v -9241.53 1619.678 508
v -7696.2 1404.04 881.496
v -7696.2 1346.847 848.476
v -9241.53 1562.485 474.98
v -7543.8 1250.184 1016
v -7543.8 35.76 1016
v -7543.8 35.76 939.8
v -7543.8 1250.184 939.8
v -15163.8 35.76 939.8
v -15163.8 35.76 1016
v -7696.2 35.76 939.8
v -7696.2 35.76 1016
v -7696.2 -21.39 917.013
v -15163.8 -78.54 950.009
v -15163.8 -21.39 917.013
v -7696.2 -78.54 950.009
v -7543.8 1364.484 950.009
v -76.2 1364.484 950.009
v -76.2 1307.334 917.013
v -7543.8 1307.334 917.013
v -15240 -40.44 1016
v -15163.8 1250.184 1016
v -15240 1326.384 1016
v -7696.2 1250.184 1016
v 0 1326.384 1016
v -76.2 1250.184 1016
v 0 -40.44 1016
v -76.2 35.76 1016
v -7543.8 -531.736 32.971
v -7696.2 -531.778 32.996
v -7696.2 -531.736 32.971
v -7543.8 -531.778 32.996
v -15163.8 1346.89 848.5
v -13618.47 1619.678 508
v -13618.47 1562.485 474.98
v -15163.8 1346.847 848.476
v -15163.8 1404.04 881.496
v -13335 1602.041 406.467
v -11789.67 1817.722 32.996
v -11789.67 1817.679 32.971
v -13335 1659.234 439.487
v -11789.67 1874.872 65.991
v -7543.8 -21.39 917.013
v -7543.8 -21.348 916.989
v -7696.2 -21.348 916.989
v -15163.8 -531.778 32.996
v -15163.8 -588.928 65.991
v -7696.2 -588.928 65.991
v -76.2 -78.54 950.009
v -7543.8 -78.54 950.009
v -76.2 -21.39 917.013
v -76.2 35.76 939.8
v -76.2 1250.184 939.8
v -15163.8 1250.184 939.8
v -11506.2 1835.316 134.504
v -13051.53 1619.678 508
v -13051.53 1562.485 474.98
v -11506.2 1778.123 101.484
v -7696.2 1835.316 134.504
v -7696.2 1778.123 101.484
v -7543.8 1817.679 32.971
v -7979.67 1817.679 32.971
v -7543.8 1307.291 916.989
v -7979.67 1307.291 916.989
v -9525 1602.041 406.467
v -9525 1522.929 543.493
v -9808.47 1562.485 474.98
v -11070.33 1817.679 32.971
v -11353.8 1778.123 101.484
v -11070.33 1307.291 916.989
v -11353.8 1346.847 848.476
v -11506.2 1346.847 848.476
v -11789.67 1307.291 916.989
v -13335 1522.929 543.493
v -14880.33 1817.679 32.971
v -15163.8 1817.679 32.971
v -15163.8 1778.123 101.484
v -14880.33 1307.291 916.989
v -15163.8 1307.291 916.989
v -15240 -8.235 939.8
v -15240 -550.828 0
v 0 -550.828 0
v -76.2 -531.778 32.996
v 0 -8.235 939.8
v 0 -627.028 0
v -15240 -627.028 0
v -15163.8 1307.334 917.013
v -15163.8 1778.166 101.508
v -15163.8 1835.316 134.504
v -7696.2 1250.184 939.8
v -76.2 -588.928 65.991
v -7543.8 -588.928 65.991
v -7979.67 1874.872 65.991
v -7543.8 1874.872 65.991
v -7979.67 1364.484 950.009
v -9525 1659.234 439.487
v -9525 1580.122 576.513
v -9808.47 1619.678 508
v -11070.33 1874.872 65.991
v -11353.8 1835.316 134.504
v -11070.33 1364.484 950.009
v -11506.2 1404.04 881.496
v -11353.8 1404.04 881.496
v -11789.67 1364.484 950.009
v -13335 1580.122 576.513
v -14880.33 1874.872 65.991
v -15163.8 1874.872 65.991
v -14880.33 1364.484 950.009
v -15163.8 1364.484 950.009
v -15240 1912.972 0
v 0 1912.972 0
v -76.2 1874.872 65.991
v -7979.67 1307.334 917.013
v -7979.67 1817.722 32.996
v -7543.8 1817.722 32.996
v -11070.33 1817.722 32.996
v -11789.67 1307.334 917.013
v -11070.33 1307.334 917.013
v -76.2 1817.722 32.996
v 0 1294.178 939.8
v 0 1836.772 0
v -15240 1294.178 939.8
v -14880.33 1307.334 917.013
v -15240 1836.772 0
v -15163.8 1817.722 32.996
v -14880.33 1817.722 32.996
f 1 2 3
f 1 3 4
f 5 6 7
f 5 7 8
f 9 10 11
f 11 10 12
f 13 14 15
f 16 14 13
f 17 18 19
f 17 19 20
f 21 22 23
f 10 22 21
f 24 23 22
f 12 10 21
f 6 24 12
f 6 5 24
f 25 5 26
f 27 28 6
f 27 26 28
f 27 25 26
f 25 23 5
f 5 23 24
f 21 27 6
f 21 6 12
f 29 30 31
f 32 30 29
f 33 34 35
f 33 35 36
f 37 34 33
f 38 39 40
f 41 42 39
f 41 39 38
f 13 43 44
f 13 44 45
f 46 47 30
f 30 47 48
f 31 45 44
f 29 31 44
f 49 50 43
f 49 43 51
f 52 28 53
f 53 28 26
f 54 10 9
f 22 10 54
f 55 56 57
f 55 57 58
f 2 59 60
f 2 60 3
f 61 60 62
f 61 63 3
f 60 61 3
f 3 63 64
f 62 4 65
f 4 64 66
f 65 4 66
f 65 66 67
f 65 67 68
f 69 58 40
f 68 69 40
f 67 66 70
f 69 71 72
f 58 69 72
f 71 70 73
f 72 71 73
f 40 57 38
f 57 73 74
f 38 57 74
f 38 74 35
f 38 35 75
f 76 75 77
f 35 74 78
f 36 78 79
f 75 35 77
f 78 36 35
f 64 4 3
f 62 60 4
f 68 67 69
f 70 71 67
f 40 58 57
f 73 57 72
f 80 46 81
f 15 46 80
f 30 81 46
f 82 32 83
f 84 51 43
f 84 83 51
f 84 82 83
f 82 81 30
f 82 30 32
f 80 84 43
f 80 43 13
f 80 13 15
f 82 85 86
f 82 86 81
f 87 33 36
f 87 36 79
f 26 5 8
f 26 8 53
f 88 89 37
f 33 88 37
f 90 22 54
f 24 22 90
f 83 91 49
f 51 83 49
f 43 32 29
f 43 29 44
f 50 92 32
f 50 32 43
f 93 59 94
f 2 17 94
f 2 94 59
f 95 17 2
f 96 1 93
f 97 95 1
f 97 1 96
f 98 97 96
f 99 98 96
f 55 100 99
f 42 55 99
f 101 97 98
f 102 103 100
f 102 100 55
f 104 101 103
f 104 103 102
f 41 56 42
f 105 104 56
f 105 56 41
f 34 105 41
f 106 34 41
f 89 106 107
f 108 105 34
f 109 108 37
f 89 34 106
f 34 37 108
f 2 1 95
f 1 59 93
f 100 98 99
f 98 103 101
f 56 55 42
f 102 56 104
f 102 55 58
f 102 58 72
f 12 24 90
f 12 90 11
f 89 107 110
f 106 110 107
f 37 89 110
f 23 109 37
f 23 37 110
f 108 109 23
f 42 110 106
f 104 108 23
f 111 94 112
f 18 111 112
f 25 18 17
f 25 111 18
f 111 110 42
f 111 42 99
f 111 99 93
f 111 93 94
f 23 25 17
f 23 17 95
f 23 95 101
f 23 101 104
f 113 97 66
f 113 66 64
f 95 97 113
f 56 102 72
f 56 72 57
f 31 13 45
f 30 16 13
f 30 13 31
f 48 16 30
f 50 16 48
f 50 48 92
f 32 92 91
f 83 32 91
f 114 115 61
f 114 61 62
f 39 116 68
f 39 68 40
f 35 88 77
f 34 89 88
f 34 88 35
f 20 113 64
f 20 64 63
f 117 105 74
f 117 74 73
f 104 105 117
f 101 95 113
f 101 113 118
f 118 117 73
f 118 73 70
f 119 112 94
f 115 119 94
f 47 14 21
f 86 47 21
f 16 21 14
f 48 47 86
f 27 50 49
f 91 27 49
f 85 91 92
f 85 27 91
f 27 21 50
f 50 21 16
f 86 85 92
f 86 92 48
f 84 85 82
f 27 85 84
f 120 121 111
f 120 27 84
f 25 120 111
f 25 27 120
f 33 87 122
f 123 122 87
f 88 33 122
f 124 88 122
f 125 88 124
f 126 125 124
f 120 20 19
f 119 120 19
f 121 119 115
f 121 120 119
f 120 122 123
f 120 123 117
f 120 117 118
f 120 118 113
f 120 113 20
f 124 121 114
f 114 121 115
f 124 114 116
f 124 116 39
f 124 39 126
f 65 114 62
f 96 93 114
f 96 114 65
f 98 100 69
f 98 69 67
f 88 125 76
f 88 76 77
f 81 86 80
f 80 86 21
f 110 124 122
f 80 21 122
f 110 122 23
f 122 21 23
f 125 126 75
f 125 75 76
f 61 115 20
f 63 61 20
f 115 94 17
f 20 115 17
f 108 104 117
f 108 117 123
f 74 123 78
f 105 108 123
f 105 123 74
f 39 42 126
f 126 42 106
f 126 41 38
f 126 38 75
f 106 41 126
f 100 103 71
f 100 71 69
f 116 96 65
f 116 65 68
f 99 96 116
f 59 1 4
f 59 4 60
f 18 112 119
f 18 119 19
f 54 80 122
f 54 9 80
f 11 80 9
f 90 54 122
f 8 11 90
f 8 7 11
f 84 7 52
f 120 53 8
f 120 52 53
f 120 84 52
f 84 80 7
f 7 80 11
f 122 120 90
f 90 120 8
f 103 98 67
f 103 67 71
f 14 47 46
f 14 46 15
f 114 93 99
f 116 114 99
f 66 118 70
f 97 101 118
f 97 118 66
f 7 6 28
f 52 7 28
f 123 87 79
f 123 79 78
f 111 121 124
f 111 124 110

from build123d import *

# Parameters (mm, degrees)
F1_DEPTH  = 15240
F2_W      = 15087.6
F2_H      = 1020.7757469933
F3_DEPTH  = 76.2
F4_W      = 15087.6
F4_H      = 1214.4242530067
F5_DEPTH  = 76.2
F6_W      = 15087.6
F6_H      = 1020.7757469933
F7_DEPTH  = 76.2
F9_DEPTH  = 66.04
F10_W     = 76.2
F10_H     = 1020.7757469933
F11_DEPTH = 66.04
F13_DEPTH = 76.2
F15_DEPTH = 66.04


with BuildPart() as f1:
    # F0 (on Right) → F1 (new body)
    with BuildSketch(Plane.YZ):
        Polygon((-40.4404837035, 1016), (-627.0283572002, 0), (-550.8283572002, 0), (-8.2345742158, 939.8), (1294.1778598154, 939.8), (1836.7716427998, 0), (1912.9716427998, 0), (1326.3837693031, 1016), align=None)
    extrude(amount=-F1_DEPTH)

    # F2 (on face) → F3 (cut)
    with BuildSketch(Plane(origin=(0, -470.2712679001, 271.5112431143), x_dir=(1, 0, 0), z_dir=(0, -0.8660254038, 0.5))):
        with Locations((-7620, 273.0736948966)):
            Rectangle(F2_W, F2_H)
    extrude(amount=-F3_DEPTH, mode=Mode.SUBTRACT)

    # F4 (on face) → F5 (cut)
    with BuildSketch(Plane.XY.offset(1016)):
        with Locations((-7620, 642.9716427998)):
            Rectangle(F4_W, F4_H)
    extrude(amount=-F5_DEPTH, mode=Mode.SUBTRACT)

    # F6 (on face) → F7 (cut)
    with BuildSketch(Plane(origin=(0, 1434.7287320999, 828.3410196919), x_dir=(-1, 0, 0), z_dir=(0, 0.8660254038, 0.5))):
        with Locations((7620, -369.8979479032)):
            Rectangle(F6_W, F6_H)
    extrude(amount=-F7_DEPTH, mode=Mode.SUBTRACT)

    # F8 (on face) → F9 (join)
    with BuildSketch(Plane(origin=(0, -470.2712679001, 271.5112431143), x_dir=(1, 0, 0), z_dir=(0, -0.8660254038, 0.5))):
        Polygon((-7543.8, 783.4615683932), (-7620, 783.4615683932), (-7620, 228.8013398647), (-7620, -237.3141786001), (-7543.8, -237.3141786001), align=None)
        Polygon((-7620, 228.8013398647), (-7620, 783.4615683932), (-7696.2, 783.4615683932), (-7696.2, -237.3141786001), (-7620, -237.3141786001), align=None)
    extrude(amount=-F9_DEPTH)

    # F10 (on face) → F11 (join)
    with BuildSketch(Plane(origin=(0, 1434.7287320999, 828.3410196919), x_dir=(-1, 0, 0), z_dir=(0, 0.8660254038, 0.5))):
        with Locations((7658.1, -369.8979479032)):
            Rectangle(F10_W, F10_H)
        with Locations((7581.9, -369.8979479032)):
            Rectangle(F10_W, F10_H)
    extrude(amount=-F11_DEPTH)

    # F12 (on face) → F13 (join)
    with BuildSketch(Plane.XY.offset(1016)):
        Polygon((-7543.8, 1250.1837693031), (-7620, 1250.1837693031), (-7696.2, 1250.1837693031), (-7696.2, 35.7595162965), (-7543.8, 35.7595162965), align=None)
    extrude(amount=-F13_DEPTH)

    # F14 (on face) → F15 (join)
    with BuildSketch(Plane(origin=(0, 1434.7287320999, 828.3410196919), x_dir=(-1, 0, 0), z_dir=(0, 0.8660254038, 0.5))):
        Polygon((11353.8, 140.4899255934), (11070.3296936126, 140.4899255934), (9525, -290.7860675027), (7979.6703063874, 140.4899255934), (7696.2, 140.4899255934), (7696.2, 61.3780451929), (9241.5296936126, -369.8979479032), (7696.2, -801.1739409994), (7696.2, -880.2858213999), (7979.6703063874, -880.2858213999), (9525, -449.0098283038), (11070.3296936126, -880.2858213999), (11353.8, -880.2858213999), (11506.2, -880.2858213999), (11789.6703063874, -880.2858213999), (13335, -449.0098283038), (14880.3296936126, -880.2858213999), (15163.8, -880.2858213999), (15163.8, -801.1739409994), (13618.4703063874, -369.8979479032), (15163.8, 61.3780451929), (15163.8, 140.4899255934), (14880.3296936127, 140.4899255934), (13335, -290.7860675027), (11789.6703063873, 140.4899255934), (11506.2, 140.4899255934), align=None)
        Polygon((9808.4703063874, -369.8979479032), (11353.8, 61.3780451929), (11353.8, -801.1739409994), align=None, mode=Mode.SUBTRACT)
        Polygon((11506.2, -801.1739409994), (11506.2, 61.3780451929), (13051.5296936127, -369.8979479032), align=None, mode=Mode.SUBTRACT)
    extrude(amount=-F15_DEPTH)


solid = f1.part
